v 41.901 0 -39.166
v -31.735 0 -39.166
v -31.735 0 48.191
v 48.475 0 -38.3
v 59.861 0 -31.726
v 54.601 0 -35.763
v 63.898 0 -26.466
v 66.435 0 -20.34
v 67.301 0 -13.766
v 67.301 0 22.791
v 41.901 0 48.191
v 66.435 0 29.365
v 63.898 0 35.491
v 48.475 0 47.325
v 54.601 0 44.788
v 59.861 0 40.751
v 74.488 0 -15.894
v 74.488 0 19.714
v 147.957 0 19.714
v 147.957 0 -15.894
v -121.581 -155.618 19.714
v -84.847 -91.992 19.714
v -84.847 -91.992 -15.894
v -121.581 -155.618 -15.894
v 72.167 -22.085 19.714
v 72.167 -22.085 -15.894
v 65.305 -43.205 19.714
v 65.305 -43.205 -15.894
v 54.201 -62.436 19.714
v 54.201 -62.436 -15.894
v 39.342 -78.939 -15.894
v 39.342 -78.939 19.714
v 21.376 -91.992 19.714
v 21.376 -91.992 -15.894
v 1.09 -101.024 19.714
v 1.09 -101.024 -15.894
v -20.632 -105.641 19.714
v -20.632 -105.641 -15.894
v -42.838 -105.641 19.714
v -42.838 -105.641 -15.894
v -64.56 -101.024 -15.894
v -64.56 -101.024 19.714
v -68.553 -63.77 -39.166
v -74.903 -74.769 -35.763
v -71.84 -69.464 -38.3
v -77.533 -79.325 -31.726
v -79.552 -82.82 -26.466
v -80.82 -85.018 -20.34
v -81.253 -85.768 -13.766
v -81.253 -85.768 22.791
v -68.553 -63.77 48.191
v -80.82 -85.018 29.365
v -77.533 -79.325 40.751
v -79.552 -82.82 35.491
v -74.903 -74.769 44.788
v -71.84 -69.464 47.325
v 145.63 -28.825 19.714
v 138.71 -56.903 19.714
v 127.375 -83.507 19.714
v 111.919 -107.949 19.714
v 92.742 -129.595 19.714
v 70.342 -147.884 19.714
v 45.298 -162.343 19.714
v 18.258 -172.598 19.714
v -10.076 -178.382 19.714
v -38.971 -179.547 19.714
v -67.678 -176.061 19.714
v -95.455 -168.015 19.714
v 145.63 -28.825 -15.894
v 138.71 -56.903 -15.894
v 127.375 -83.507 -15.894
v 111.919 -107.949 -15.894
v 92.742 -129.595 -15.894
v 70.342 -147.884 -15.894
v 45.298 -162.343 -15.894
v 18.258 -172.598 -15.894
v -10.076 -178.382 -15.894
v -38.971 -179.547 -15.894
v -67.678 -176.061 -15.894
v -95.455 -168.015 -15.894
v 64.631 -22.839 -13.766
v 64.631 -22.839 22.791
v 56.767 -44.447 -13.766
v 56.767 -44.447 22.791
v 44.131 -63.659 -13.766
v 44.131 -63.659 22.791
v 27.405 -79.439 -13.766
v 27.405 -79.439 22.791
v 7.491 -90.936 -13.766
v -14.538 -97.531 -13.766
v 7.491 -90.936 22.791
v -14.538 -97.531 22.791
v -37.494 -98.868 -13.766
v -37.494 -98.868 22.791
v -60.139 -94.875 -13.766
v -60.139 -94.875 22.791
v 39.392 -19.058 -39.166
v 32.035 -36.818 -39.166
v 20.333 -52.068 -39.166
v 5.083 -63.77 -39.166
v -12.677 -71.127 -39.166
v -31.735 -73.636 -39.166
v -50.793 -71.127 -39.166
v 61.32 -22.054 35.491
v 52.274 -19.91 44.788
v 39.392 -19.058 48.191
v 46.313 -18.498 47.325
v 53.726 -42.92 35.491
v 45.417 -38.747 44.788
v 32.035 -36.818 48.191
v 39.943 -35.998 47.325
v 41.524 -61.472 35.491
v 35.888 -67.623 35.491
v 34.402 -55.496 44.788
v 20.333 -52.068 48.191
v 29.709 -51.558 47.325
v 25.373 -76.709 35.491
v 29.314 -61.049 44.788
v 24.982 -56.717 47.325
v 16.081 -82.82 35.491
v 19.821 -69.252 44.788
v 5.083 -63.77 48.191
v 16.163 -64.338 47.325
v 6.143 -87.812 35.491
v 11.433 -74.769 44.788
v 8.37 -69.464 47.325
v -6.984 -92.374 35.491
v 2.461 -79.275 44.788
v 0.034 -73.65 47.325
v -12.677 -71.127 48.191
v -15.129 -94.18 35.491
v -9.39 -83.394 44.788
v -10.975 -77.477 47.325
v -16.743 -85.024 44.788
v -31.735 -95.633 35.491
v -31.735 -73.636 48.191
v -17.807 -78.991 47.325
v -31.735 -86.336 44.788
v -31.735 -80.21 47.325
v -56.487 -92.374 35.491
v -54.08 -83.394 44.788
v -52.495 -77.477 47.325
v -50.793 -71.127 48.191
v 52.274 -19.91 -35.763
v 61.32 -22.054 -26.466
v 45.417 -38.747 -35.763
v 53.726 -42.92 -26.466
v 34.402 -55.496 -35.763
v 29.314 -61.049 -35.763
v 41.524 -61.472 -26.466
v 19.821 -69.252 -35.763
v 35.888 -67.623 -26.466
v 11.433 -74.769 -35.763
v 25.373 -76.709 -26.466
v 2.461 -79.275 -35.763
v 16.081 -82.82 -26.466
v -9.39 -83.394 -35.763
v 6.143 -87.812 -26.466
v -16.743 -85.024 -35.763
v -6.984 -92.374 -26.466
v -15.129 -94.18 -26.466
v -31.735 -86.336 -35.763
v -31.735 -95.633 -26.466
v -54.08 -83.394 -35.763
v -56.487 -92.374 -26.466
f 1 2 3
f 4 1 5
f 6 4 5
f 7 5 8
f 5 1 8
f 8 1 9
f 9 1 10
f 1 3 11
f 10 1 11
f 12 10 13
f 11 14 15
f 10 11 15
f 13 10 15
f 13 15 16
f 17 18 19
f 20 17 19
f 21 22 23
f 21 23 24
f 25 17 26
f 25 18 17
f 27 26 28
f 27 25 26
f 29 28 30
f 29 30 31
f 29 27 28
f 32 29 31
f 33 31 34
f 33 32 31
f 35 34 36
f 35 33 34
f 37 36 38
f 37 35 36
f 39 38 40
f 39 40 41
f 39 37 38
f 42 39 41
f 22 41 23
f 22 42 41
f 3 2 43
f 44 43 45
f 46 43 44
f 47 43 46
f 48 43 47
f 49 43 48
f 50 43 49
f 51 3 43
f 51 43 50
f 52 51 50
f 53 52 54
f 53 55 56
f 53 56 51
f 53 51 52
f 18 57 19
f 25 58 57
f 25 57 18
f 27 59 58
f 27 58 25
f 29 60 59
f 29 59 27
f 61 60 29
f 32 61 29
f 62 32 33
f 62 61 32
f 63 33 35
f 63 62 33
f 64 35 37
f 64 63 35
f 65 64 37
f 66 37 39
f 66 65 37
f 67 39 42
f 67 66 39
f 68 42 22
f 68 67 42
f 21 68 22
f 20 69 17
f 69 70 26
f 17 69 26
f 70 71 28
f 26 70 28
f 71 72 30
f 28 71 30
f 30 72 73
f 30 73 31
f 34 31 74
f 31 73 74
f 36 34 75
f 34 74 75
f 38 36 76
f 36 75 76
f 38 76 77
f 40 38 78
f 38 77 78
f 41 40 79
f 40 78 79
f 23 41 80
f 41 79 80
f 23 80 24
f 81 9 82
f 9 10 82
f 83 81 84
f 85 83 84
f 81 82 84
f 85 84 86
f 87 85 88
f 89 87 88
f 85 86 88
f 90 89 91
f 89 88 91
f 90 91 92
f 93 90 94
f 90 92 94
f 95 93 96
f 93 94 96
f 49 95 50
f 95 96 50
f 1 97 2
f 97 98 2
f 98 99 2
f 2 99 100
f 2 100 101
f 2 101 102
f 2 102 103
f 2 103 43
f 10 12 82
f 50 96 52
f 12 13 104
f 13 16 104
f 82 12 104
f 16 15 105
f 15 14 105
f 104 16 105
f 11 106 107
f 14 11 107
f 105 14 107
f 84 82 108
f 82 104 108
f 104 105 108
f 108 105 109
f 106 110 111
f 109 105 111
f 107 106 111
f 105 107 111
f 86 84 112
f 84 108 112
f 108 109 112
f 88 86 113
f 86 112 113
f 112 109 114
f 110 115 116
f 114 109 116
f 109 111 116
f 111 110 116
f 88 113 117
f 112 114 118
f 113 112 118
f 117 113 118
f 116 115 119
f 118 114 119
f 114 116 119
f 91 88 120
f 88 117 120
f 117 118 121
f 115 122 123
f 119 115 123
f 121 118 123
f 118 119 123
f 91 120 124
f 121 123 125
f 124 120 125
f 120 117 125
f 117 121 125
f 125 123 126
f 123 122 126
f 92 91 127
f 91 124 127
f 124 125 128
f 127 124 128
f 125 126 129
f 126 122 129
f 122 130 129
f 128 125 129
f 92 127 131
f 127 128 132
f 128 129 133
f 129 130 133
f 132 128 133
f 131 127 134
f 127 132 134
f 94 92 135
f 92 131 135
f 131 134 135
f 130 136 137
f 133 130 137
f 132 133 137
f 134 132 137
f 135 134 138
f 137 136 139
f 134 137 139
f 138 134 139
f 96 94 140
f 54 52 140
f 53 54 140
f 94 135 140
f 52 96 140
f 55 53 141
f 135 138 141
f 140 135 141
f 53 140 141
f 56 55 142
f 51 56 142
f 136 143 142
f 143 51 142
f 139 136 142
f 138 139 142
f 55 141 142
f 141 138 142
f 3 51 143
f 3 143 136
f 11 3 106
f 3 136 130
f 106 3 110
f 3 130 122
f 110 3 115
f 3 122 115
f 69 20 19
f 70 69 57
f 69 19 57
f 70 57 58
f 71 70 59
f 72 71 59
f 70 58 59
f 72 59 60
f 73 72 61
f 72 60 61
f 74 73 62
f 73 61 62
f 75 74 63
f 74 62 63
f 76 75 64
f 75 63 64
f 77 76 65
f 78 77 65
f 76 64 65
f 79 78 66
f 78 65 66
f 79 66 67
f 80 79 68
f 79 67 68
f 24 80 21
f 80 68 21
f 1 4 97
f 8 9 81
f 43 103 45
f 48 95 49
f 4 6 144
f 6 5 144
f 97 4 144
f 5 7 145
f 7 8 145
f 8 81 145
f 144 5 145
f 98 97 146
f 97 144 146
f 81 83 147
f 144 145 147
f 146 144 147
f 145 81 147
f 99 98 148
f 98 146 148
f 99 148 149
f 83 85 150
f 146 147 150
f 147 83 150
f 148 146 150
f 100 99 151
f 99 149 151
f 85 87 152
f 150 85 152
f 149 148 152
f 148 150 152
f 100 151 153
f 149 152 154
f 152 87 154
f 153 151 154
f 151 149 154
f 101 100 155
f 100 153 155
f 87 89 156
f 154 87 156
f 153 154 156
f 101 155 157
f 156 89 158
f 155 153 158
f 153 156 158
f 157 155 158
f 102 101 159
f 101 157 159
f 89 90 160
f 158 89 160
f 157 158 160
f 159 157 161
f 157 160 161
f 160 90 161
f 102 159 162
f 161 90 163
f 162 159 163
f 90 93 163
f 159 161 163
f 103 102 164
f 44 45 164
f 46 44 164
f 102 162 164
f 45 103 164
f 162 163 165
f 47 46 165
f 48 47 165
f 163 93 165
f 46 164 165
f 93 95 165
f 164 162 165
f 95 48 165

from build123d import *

# Parameters (mm, degrees)
F1_ANGLE = 120
F0_W     = 73.4693109989
F0_H     = 35.6082208455


with BuildPart() as f1:
    # F0 (on Front) → F1 (revolve)
    with BuildSketch(Plane.XZ):
        with BuildLine():
            Line((41.9007050037, 48.1907352805), (-31.7351222038, 48.1907352805))
            Line((-31.7351222038, 48.1907352805), (-31.7351222038, -39.1657203436))
            Line((-31.7351222038, -39.1657203436), (41.9007050037, -39.1657203436))
            ThreePointArc((41.9007050037, -39.1657203436), (59.8612172459, -31.7262325857), (67.3007050037, -13.7657203436))
            Line((67.3007050037, -13.7657203436), (67.3007050037, 22.7907352805))
            ThreePointArc((67.3007050037, 22.7907352805), (59.8612172459, 40.7512475227), (41.9007050037, 48.1907352805))
        make_face()
    revolve(axis=Axis((-31.7351222038, 0, 4.5125074685), (0, 0, -1)), revolution_arc=F1_ANGLE)


with BuildPart() as f1b:
    # F0 (on Front) → F1, piece 2 (revolve)
    with BuildSketch(Plane.XZ):
        with Locations((111.2226247787, 1.9099842757)):
            Rectangle(F0_W, F0_H)
    revolve(axis=Axis((-31.7351222038, 0, 4.5125074685), (0, 0, -1)), revolution_arc=F1_ANGLE)


solid = Compound([f1.part, f1b.part])
